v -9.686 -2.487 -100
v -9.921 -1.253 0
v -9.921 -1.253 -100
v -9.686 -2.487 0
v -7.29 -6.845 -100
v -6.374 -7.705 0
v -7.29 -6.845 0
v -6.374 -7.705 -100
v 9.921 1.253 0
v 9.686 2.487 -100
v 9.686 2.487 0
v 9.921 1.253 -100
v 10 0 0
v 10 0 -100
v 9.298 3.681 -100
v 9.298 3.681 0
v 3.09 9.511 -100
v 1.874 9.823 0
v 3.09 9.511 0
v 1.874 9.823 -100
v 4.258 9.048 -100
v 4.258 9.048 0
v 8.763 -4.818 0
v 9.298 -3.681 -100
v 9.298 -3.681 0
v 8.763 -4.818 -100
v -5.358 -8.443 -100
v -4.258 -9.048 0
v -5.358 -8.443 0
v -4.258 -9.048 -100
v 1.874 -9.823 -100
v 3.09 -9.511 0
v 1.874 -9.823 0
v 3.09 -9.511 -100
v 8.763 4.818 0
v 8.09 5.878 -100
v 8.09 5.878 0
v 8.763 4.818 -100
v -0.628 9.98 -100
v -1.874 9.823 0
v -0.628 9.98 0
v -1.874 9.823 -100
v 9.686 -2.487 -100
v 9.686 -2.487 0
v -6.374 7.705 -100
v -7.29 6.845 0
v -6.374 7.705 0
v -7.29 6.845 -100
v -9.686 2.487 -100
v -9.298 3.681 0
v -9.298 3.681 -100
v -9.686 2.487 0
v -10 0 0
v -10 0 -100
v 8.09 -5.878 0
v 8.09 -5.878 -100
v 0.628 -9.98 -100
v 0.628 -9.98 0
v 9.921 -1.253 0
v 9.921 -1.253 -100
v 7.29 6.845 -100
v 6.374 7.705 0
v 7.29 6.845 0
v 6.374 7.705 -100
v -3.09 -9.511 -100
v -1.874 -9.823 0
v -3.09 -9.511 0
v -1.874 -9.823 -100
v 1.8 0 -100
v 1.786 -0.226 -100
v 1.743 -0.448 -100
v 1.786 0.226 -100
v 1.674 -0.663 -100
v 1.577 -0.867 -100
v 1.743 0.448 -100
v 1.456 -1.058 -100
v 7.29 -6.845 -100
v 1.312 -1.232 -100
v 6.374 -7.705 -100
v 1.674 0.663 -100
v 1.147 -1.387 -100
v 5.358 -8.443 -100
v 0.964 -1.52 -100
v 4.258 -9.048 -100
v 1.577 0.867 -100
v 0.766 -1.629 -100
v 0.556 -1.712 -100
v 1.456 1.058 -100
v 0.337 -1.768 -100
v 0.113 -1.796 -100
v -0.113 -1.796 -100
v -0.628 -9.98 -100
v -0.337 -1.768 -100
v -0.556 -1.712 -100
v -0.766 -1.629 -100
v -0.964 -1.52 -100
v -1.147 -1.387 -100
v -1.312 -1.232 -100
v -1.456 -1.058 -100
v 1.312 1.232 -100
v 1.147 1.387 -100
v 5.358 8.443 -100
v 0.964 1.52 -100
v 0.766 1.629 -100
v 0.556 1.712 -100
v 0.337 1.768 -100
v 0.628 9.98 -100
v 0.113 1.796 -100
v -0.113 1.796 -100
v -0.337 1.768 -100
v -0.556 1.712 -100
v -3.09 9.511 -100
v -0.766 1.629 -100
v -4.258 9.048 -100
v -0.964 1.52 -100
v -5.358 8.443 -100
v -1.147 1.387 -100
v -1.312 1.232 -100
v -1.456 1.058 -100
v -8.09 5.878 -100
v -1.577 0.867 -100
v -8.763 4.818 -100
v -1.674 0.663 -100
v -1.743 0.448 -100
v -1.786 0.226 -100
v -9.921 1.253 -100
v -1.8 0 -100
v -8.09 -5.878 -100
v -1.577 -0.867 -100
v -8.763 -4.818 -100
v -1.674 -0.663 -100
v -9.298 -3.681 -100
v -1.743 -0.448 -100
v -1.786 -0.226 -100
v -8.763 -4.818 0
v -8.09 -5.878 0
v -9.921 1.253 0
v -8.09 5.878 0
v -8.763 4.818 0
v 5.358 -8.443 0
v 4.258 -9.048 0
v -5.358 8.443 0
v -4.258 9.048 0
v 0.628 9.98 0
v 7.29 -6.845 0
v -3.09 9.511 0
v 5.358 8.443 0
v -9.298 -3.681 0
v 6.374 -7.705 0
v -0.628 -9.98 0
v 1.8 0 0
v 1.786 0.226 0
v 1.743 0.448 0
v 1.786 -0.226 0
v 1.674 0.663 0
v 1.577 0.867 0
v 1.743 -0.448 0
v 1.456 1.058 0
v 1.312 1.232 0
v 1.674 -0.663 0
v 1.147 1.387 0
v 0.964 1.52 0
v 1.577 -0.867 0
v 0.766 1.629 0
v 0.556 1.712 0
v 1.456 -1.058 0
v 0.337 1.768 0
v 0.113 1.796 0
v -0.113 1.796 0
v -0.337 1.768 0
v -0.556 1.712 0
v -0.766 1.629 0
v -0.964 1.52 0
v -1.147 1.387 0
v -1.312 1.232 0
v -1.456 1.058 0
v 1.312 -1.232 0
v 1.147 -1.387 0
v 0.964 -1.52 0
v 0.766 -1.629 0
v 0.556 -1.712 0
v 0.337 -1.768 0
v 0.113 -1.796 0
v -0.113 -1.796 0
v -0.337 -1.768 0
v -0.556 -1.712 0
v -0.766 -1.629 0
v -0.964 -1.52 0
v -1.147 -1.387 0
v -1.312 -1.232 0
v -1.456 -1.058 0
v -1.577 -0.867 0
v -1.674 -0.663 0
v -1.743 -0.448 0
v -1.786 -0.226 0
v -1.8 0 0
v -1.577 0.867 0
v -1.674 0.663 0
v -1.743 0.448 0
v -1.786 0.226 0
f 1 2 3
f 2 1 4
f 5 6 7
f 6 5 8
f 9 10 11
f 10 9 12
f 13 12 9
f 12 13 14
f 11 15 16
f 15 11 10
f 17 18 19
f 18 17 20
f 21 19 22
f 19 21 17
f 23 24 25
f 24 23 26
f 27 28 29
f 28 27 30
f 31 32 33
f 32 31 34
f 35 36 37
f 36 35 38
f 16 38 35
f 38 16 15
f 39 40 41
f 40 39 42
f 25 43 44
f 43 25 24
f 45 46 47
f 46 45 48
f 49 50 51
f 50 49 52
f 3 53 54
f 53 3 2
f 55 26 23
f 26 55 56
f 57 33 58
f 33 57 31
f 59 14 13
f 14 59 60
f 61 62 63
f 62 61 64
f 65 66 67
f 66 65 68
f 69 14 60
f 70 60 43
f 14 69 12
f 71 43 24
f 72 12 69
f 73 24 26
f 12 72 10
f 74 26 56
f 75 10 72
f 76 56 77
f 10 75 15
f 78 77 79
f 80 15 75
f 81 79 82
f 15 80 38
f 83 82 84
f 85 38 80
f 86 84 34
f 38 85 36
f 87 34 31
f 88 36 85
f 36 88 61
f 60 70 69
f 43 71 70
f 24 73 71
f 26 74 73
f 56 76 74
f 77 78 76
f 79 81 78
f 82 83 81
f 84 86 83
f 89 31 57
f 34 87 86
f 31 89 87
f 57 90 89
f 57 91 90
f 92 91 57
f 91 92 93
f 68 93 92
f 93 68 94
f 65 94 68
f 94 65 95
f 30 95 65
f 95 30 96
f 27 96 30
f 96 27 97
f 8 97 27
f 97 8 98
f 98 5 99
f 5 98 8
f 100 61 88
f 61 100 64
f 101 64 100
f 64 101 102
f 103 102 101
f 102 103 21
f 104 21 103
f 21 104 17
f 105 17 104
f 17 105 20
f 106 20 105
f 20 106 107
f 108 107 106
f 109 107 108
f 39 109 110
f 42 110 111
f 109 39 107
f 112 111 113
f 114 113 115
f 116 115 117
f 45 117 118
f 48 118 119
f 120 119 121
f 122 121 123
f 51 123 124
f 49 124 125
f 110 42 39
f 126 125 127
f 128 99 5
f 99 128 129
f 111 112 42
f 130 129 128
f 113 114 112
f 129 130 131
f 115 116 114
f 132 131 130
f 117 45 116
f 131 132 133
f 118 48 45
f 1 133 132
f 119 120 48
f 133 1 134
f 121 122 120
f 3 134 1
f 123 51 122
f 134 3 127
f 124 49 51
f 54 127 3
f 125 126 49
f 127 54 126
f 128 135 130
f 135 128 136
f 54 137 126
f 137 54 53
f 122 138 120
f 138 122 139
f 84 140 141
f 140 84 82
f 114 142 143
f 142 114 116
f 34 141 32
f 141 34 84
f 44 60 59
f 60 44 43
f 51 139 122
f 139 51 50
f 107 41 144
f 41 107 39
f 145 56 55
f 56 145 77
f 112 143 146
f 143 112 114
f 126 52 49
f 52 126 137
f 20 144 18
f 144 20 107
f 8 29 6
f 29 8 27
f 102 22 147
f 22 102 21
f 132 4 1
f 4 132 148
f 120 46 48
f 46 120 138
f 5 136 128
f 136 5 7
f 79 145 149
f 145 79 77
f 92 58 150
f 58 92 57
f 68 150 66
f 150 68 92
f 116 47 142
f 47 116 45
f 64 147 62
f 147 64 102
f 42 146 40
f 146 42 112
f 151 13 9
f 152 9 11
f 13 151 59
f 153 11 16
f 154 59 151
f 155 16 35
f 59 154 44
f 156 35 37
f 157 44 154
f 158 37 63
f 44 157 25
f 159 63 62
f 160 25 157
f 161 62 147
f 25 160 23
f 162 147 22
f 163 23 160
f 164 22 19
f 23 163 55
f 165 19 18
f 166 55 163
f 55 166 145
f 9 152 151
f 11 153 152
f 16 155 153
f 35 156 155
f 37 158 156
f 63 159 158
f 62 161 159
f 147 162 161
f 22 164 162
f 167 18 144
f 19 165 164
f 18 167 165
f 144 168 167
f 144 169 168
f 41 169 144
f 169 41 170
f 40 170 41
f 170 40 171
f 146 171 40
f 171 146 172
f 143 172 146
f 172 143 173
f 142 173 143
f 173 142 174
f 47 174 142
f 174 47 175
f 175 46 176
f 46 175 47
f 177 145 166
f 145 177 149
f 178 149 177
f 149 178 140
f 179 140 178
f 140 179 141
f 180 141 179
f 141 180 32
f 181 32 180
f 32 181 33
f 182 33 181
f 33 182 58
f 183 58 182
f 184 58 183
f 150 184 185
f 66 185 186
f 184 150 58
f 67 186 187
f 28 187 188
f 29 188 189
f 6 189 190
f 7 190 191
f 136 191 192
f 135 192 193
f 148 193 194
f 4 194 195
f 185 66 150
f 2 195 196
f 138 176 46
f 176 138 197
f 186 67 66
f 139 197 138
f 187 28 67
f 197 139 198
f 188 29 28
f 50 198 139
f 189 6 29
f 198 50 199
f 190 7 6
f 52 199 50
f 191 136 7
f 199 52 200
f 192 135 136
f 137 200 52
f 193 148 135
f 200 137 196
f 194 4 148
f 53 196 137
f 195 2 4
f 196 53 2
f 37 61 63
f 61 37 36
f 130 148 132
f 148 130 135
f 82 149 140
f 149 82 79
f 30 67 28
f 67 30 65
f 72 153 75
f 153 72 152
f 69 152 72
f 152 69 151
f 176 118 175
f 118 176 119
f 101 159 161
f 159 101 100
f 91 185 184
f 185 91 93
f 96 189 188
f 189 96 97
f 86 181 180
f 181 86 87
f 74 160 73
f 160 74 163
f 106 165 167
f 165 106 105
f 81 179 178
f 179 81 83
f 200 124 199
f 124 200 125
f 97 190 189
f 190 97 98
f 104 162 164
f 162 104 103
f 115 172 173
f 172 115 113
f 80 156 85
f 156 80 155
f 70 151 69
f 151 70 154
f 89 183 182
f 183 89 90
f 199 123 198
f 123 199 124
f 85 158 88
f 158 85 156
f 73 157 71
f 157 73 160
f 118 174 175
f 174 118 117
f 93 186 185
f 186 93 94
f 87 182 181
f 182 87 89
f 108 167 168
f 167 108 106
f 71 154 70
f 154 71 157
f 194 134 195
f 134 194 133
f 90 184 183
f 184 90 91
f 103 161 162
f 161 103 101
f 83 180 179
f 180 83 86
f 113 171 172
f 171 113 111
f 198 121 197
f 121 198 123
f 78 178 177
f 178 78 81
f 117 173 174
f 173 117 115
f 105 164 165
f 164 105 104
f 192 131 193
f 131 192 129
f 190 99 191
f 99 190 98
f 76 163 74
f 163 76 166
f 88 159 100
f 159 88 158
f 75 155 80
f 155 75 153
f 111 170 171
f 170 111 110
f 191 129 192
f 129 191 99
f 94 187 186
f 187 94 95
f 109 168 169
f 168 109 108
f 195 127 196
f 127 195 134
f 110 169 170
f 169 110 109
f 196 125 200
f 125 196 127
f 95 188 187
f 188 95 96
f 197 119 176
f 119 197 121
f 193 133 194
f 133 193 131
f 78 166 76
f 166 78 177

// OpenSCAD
$fn = 50;


difference() {
	union() {
		translate(v = [0, 0, -100.0000000000]) {
			cylinder(h = 100, r = 10.0000000000);
		}
	}
	union() {
		#translate(v = [0, 0, -100]) {
			cylinder(h = 100, r = 1.8000000000);
		}
	}
}
